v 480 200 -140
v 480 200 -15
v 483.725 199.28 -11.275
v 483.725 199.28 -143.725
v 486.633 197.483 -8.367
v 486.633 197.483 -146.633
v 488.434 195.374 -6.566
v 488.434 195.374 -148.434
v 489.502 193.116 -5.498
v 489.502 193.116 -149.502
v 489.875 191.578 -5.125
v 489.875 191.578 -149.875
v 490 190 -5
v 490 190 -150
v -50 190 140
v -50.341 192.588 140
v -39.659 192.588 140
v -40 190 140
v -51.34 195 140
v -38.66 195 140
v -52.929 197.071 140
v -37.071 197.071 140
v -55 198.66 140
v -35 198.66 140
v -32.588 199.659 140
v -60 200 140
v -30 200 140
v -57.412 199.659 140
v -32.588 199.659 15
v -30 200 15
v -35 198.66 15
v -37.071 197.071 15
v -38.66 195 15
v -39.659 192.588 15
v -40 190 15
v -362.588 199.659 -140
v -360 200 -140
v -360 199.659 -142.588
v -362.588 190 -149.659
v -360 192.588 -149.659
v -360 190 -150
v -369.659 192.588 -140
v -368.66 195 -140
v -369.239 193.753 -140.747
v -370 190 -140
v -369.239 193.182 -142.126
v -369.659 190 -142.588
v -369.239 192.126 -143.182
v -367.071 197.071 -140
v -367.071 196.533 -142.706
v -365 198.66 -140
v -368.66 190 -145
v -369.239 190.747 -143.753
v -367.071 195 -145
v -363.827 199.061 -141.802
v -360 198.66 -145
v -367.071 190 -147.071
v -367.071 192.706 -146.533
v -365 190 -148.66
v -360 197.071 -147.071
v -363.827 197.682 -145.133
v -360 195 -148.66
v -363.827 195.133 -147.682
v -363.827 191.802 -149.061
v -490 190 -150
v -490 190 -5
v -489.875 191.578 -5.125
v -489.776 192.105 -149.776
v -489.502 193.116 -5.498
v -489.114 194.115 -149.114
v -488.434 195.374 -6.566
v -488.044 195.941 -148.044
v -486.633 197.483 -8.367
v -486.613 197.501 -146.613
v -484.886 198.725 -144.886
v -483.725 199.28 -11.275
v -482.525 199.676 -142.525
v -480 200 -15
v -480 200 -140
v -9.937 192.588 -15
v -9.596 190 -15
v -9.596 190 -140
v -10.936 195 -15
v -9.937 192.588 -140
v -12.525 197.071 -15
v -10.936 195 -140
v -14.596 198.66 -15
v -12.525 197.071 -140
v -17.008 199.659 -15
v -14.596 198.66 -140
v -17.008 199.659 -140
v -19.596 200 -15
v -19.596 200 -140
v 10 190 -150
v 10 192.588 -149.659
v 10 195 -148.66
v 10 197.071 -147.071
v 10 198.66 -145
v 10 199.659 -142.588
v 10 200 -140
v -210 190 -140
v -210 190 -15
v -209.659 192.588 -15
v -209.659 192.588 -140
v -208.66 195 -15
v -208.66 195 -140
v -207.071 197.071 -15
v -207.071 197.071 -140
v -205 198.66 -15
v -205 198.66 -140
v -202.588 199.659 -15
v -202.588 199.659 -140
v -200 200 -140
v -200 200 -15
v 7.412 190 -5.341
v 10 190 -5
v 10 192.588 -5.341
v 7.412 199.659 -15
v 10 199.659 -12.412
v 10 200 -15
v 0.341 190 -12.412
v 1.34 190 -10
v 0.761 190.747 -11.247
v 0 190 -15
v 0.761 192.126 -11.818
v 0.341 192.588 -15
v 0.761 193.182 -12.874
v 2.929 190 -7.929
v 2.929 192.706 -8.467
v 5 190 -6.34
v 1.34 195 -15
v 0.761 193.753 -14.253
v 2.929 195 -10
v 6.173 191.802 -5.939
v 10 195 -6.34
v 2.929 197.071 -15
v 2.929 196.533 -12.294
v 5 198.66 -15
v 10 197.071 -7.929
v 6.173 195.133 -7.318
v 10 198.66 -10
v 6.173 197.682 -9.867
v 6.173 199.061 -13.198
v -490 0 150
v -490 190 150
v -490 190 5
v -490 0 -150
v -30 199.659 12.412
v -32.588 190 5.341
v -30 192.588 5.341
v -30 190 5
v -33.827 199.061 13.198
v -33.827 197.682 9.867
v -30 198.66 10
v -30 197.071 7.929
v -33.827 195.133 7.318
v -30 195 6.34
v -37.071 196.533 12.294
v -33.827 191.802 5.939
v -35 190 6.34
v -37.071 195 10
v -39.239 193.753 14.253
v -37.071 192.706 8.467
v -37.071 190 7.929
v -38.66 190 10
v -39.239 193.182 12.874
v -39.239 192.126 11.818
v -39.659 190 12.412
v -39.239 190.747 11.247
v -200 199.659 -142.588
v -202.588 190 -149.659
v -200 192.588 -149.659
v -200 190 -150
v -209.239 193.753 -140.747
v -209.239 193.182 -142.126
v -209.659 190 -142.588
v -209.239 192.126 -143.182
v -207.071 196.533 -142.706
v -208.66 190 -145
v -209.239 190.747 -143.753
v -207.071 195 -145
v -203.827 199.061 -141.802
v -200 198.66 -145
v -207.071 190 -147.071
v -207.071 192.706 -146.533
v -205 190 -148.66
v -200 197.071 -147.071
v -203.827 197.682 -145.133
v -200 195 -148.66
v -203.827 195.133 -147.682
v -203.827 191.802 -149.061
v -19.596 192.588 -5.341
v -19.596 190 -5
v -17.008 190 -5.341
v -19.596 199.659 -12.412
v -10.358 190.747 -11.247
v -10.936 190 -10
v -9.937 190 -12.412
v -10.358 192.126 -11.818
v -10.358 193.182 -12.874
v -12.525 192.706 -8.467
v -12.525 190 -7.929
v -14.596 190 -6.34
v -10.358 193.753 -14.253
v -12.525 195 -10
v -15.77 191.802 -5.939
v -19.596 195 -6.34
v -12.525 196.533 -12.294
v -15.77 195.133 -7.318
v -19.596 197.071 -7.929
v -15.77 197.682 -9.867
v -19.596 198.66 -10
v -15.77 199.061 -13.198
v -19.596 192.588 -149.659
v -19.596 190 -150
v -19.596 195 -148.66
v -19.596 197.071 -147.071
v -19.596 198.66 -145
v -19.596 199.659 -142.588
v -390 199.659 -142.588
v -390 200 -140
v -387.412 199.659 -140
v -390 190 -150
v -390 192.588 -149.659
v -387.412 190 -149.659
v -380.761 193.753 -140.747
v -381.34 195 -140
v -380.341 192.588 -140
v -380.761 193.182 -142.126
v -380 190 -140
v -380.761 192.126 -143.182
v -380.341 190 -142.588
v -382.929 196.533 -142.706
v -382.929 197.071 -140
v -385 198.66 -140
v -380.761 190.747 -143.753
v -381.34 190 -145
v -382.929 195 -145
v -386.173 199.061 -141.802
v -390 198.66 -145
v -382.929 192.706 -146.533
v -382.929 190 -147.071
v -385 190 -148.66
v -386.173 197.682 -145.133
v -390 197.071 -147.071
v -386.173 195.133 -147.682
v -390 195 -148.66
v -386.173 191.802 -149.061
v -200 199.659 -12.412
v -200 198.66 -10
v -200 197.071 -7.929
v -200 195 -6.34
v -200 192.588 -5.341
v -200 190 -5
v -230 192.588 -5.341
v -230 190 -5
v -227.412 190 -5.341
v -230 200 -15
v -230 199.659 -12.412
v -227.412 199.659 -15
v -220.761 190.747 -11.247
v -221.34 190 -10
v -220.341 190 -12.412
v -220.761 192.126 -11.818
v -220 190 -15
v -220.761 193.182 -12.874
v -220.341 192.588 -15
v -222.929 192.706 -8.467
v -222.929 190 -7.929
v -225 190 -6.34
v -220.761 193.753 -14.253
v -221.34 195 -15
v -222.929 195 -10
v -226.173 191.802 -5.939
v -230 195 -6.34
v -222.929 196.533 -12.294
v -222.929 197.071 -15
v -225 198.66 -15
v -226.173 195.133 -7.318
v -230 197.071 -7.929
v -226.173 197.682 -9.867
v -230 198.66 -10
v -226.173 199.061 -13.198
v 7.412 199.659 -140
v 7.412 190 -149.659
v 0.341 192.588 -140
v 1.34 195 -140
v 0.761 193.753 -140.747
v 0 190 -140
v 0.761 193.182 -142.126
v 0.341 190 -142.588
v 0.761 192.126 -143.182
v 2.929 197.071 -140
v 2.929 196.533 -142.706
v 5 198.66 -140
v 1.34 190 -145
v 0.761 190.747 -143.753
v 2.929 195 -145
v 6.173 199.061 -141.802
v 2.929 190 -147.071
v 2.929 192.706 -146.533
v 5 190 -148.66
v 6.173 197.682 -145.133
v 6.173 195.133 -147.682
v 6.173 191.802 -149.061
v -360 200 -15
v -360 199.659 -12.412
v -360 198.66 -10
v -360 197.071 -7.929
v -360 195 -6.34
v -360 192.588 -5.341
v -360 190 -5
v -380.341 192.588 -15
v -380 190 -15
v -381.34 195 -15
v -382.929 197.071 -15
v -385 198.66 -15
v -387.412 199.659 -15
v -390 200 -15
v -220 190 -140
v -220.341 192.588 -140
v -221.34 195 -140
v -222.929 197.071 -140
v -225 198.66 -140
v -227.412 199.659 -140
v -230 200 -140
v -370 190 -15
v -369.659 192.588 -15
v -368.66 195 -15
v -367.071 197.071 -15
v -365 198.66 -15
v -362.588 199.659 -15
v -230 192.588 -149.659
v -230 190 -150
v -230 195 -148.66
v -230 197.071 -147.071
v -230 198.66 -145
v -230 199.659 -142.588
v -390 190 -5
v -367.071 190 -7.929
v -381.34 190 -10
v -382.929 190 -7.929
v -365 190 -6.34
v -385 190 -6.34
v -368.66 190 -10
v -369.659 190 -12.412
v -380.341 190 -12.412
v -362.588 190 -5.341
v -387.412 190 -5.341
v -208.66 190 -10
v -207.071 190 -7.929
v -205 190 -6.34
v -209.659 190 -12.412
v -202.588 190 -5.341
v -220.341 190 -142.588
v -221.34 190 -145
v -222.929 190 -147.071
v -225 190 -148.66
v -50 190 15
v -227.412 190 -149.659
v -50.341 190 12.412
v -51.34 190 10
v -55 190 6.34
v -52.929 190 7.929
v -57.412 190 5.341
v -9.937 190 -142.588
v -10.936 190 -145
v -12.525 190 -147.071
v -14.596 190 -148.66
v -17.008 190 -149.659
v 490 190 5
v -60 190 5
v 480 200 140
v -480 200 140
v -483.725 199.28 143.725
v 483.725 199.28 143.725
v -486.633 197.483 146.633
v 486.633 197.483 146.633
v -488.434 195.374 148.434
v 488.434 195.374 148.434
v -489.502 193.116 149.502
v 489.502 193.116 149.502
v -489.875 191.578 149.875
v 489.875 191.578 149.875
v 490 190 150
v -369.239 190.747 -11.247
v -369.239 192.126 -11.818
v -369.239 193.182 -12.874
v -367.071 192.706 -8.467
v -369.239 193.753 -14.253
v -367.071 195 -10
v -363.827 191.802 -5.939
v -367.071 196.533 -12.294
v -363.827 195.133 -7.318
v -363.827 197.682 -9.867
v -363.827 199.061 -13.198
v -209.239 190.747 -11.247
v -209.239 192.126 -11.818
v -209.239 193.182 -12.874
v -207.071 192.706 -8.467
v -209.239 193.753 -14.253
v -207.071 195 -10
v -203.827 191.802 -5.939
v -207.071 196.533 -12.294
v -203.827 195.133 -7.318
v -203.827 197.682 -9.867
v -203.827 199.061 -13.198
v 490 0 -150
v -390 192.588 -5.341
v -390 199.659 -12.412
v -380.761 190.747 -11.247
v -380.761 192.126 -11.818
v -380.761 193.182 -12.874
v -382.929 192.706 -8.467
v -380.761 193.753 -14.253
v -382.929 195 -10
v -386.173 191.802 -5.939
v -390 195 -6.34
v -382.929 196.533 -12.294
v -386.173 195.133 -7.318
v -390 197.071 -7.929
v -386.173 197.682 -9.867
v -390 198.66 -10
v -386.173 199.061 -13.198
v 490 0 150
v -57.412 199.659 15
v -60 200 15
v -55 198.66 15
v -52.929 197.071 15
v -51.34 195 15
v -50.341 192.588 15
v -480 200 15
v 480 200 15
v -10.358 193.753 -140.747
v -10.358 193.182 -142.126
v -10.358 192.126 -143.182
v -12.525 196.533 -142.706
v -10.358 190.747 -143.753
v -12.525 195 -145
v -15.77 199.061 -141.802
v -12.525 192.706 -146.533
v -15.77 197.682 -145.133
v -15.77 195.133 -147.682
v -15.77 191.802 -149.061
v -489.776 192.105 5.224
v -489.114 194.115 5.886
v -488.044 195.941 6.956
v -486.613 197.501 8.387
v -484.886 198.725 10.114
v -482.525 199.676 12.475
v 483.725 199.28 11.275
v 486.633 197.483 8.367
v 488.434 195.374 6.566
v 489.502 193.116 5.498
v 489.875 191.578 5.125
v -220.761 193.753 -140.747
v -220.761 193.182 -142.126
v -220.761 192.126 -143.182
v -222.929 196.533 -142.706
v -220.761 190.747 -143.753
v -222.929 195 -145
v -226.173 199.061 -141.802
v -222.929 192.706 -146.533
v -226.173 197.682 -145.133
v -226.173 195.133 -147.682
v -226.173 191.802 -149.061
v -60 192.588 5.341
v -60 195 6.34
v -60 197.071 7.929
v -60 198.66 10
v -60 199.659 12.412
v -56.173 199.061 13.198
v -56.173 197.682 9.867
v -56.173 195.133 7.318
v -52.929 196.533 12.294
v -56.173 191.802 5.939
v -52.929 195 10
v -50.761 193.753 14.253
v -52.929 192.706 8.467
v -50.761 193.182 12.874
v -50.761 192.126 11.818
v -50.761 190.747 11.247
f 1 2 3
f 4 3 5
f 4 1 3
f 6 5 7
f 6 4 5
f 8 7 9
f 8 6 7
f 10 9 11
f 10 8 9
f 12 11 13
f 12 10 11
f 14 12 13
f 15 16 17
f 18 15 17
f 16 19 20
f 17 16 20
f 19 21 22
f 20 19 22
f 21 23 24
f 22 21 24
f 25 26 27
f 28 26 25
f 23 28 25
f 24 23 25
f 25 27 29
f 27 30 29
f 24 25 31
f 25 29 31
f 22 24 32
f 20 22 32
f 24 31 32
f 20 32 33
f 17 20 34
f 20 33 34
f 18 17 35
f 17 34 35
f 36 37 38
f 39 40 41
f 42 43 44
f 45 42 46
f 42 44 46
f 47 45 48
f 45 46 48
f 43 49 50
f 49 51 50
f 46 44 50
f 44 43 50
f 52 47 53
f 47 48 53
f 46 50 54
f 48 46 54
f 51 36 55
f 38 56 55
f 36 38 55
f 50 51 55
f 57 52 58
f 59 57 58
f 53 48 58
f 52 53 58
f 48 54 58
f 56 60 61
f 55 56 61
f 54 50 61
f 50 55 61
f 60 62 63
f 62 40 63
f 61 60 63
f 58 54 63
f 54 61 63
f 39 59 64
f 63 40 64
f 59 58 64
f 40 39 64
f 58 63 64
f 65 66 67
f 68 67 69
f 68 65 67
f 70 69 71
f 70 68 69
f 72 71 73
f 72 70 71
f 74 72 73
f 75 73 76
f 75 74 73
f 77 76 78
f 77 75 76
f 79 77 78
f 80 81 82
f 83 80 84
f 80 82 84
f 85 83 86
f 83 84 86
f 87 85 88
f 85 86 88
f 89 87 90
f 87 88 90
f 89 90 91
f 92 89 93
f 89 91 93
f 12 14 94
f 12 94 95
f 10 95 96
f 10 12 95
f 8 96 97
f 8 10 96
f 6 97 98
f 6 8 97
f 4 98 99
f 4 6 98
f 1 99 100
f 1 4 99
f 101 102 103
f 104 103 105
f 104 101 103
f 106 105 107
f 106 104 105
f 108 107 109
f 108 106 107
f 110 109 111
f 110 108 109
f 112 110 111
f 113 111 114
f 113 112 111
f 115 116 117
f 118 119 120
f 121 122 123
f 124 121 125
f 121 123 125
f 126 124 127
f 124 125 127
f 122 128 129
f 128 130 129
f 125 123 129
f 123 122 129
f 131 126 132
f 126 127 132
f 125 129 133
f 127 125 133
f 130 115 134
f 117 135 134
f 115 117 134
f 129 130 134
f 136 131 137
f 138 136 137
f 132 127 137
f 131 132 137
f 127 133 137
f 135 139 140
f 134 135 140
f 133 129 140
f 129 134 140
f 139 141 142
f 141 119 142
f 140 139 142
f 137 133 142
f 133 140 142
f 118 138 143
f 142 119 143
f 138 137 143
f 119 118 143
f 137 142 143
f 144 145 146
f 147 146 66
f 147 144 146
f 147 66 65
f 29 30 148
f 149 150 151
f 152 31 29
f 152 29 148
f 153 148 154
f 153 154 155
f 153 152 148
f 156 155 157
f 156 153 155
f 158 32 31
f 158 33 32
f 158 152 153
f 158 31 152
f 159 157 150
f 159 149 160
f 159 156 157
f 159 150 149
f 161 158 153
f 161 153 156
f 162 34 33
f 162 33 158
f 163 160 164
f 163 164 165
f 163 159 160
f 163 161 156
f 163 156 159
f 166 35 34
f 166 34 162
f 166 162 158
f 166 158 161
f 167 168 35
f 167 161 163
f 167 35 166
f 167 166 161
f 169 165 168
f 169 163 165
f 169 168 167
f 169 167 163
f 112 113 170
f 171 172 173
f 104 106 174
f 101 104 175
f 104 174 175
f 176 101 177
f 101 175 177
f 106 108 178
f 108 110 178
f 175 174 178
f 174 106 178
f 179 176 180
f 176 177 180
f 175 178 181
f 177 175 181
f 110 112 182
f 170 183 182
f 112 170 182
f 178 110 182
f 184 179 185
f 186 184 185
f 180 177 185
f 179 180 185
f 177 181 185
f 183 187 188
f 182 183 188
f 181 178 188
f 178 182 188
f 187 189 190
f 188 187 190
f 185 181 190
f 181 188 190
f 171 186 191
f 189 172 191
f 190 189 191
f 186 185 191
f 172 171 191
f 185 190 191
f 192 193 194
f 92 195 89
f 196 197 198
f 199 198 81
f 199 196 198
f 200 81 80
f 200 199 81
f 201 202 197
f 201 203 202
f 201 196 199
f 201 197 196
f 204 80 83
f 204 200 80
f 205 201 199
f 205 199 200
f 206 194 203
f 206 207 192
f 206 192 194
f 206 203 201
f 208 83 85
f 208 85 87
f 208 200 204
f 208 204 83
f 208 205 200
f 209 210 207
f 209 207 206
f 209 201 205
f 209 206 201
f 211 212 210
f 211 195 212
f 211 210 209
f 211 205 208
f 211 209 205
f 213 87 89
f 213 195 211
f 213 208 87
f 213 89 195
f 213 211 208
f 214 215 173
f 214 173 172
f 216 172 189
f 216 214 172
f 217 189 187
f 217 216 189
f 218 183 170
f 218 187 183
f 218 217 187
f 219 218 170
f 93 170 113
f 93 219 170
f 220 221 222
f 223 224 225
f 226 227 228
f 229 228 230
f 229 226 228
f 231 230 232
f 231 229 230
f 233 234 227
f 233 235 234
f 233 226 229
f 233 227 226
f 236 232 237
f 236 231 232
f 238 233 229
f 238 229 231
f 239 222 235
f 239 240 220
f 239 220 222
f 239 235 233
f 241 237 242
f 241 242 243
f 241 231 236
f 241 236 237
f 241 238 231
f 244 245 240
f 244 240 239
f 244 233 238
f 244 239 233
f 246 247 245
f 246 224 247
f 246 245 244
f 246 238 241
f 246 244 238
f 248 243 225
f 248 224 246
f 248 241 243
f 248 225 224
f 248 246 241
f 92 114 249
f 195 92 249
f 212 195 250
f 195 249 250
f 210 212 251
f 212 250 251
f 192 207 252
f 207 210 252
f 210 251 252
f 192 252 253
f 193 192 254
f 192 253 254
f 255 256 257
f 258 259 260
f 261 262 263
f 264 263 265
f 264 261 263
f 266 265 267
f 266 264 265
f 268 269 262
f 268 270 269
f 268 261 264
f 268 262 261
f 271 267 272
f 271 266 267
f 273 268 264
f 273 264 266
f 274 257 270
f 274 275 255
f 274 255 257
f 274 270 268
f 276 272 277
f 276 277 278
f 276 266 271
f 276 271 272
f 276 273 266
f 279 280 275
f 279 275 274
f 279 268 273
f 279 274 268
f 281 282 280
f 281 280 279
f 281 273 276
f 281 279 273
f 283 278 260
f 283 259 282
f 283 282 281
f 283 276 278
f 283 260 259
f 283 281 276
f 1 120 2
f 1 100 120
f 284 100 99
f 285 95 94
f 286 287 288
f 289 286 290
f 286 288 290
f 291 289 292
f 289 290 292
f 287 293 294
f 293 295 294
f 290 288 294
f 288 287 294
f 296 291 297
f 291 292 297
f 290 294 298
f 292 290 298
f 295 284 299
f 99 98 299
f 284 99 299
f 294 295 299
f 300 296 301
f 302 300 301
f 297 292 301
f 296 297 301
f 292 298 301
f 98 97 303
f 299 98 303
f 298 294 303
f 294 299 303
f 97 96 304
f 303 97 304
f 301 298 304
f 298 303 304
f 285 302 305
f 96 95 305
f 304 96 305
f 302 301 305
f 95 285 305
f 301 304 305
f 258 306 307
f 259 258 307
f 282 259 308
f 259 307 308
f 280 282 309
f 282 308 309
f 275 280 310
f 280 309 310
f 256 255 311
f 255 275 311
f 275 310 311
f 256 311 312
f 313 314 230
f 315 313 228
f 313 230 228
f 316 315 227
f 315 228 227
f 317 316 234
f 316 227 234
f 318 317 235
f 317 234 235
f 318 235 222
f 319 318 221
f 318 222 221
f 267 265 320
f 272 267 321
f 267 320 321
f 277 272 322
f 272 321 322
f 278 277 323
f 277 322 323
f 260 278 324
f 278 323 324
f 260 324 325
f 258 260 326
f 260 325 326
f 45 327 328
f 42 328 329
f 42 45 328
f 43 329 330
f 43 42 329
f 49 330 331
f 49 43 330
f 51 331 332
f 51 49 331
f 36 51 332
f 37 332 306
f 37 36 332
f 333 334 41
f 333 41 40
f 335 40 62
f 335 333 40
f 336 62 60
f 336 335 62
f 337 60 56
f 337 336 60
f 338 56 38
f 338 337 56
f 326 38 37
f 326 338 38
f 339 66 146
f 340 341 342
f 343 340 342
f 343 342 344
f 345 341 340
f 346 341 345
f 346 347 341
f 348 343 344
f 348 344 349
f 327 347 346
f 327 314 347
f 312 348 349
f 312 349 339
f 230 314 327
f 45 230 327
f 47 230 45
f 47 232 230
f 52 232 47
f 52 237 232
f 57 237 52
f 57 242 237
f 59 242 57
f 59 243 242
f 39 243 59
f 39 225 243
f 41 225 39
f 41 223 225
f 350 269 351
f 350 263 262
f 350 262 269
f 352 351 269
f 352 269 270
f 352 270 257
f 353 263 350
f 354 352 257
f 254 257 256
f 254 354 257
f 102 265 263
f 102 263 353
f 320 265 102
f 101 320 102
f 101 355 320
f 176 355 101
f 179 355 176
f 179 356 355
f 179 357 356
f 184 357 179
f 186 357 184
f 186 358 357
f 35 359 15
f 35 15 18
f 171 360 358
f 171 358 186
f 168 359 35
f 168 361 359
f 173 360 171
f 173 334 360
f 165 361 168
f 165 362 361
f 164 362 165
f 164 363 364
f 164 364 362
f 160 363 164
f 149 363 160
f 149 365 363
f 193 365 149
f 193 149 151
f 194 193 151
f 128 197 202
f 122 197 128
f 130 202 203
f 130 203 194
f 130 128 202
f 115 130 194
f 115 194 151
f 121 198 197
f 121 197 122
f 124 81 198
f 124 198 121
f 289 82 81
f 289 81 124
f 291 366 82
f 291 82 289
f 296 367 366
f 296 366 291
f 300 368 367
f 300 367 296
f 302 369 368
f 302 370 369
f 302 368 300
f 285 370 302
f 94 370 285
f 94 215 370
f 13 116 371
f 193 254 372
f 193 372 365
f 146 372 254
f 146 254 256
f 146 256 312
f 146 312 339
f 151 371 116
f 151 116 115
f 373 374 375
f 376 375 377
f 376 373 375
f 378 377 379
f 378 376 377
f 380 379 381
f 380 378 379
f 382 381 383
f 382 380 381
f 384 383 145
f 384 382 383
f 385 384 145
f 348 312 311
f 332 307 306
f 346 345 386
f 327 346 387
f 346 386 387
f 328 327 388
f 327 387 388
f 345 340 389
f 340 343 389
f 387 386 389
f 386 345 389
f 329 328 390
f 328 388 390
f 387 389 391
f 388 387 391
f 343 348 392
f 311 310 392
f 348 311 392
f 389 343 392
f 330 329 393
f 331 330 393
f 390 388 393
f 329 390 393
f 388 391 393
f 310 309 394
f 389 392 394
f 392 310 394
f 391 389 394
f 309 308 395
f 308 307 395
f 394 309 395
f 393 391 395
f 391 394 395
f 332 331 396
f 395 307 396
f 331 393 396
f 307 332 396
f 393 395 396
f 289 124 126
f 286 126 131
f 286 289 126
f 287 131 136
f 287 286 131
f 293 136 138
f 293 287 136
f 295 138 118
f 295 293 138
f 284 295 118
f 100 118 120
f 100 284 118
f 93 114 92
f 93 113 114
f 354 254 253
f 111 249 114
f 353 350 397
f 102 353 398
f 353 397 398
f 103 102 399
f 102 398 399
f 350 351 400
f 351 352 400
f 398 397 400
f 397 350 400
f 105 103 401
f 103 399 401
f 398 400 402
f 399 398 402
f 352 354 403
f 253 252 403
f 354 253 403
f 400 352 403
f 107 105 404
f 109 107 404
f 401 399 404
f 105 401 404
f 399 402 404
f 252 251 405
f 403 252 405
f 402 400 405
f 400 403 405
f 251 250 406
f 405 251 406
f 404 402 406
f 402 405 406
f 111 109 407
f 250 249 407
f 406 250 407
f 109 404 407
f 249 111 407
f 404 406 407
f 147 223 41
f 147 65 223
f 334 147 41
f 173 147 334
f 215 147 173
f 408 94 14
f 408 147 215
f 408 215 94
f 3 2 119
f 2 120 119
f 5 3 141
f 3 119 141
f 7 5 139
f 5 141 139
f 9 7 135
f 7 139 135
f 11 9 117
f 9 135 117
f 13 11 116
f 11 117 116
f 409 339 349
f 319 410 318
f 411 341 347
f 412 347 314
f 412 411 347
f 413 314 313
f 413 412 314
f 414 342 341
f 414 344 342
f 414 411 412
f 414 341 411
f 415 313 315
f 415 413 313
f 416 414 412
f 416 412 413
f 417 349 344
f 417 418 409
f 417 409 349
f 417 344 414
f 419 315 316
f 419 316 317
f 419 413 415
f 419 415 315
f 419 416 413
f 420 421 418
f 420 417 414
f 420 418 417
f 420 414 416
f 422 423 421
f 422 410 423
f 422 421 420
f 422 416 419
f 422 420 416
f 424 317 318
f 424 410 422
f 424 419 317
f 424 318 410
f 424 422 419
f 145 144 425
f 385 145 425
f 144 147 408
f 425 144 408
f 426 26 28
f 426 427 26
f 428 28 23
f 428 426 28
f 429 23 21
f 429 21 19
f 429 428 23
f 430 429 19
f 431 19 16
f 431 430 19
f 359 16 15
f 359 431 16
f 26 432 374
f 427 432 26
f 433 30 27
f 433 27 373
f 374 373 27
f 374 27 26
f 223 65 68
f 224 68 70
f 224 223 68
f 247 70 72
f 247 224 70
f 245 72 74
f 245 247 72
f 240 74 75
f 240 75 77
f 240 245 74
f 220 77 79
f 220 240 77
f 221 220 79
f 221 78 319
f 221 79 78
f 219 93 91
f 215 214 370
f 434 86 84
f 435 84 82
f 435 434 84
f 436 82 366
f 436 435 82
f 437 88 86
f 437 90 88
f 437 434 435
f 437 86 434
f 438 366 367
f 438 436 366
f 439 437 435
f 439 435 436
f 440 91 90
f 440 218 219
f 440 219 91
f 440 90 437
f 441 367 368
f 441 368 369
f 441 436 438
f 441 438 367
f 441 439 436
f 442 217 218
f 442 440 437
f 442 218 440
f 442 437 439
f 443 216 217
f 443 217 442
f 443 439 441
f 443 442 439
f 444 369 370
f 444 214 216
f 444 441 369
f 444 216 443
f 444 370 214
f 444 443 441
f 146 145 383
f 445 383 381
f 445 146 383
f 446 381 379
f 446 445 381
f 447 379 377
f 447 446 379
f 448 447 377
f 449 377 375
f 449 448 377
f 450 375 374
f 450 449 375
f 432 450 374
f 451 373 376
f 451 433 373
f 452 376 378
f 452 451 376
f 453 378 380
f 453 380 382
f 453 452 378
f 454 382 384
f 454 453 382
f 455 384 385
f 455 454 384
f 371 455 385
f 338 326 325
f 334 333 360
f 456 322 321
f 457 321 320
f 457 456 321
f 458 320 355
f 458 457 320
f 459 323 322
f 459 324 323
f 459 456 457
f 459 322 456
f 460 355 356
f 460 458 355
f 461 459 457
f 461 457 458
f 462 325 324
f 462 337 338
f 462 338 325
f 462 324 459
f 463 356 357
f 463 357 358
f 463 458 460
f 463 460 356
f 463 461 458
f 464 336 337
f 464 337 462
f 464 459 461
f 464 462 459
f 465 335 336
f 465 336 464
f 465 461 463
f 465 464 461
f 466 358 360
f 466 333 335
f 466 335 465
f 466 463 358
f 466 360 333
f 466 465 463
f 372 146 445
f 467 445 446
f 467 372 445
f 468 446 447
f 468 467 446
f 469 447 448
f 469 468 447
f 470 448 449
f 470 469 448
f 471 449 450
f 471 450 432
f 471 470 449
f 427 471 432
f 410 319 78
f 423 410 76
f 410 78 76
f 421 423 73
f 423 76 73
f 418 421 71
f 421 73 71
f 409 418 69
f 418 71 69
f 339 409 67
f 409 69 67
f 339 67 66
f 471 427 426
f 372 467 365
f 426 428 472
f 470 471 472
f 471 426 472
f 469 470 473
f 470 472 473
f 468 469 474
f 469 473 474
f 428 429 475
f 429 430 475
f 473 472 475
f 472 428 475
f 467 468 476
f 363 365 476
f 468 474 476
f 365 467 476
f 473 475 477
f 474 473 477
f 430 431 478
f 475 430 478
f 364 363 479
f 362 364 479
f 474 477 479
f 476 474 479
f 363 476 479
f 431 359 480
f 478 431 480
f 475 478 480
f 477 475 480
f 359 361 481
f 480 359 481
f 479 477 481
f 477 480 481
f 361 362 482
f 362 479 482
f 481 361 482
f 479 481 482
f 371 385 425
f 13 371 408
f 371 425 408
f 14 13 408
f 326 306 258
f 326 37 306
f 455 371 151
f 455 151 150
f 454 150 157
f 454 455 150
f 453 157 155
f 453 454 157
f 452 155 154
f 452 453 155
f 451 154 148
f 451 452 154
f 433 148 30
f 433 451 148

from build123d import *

# Parameters (mm, degrees)
SKETCH1_W           = 980
SKETCH1_H           = 300
BOSS_EXTRUDE1_DEPTH = 200
CUT_EXTRUDE1_DEPTH  = 10
FILLET1_R           = 10
SKETCH3_W           = 10
SKETCH3_H           = 145
SKETCH3_W_2         = 9.596436682
SKETCH3_H_2         = 135
CUT_EXTRUDE2_DEPTH  = 10
FILLET2_R           = 10


with BuildPart() as part:
    # Sketch1 → Boss-Extrude1 (new body)
    with BuildSketch(Plane(origin=(0, 0, 0), x_dir=(1, 0, 0), z_dir=(0, 1, 0))):
        Rectangle(SKETCH1_W, SKETCH1_H)
    extrude(amount=BOSS_EXTRUDE1_DEPTH)

    # Sketch2 → Cut-Extrude1 (cut)
    with BuildSketch(Plane(origin=(0, 200, 0), x_dir=(1, 0, 0), z_dir=(0, 1, 0))):
        Polygon((0, -5), (490, -5), (490, 5), (-490, 5), (-490, -5), align=None)
    extrude(amount=-CUT_EXTRUDE1_DEPTH, mode=Mode.SUBTRACT)

    # Fillet1
    fillet1_edges = [part.edges().sort_by_distance(p)[0] for p in [
        (490, 200, 77.5),
        (490, 200, -77.5),
        (0, 200, -150),
        (0, 200, 150),
        (0, 200, -5),
        (0, 200, 5),
        (-490, 200, -77.5),
        (-490, 200, 77.5),
    ]]
    fillet(fillet1_edges, radius=FILLET1_R - 0.0001)  # a hair under: the kernel refuses the full size

    # Sketch3 → Cut-Extrude2 (cut)
    with BuildSketch(Plane(origin=(0, 200, 0), x_dir=(1, 0, 0), z_dir=(0, 1, 0))):
        with Locations((-375, 77.5)):
            Rectangle(SKETCH3_W, SKETCH3_H)
        with Locations((-215, 77.5)):
            Rectangle(SKETCH3_W, SKETCH3_H)
        with Locations((-4.798218341, 77.5)):
            Rectangle(SKETCH3_W_2, SKETCH3_H)
        with Locations((-45, -72.5)):
            Rectangle(SKETCH3_W, SKETCH3_H_2)
    extrude(amount=-CUT_EXTRUDE2_DEPTH, mode=Mode.SUBTRACT)

    # Fillet2
    fillet2_edges = [part.edges().sort_by_distance(p)[0] for p in [
        (-50, 200, 77.49995),
        (-40, 200, 77.49995),
        (0, 200, -77.5),
        (-9.596436682, 200, -77.5),
        (-210, 200, -77.5),
        (-380, 200, -77.5),
        (-220, 200, -77.5),
        (-370, 200, -77.5),
        (-50, 197.071097101, 7.928902899),
        (-40, 197.071097101, 7.928902899),
        (0, 197.071097101, -7.928902899),
        (0, 197.071097101, -147.071097101),
        (-9.596436682, 197.071097101, -147.071097101),
        (-9.596436682, 197.071097101, -7.928902899),
        (-210, 197.071097101, -7.928902899),
        (-210, 197.071097101, -147.071097101),
        (-380, 197.071097101, -147.071097101),
        (-380, 197.071097101, -7.928902899),
        (-220, 197.071097101, -147.071097101),
        (-220, 197.071097101, -7.928902899),
        (-370, 197.071097101, -7.928902899),
        (-370, 197.071097101, -147.071097101),
    ]]
    fillet(fillet2_edges, radius=FILLET2_R - 0.0001)  # a hair under: the kernel refuses the full size


solid = part.part
